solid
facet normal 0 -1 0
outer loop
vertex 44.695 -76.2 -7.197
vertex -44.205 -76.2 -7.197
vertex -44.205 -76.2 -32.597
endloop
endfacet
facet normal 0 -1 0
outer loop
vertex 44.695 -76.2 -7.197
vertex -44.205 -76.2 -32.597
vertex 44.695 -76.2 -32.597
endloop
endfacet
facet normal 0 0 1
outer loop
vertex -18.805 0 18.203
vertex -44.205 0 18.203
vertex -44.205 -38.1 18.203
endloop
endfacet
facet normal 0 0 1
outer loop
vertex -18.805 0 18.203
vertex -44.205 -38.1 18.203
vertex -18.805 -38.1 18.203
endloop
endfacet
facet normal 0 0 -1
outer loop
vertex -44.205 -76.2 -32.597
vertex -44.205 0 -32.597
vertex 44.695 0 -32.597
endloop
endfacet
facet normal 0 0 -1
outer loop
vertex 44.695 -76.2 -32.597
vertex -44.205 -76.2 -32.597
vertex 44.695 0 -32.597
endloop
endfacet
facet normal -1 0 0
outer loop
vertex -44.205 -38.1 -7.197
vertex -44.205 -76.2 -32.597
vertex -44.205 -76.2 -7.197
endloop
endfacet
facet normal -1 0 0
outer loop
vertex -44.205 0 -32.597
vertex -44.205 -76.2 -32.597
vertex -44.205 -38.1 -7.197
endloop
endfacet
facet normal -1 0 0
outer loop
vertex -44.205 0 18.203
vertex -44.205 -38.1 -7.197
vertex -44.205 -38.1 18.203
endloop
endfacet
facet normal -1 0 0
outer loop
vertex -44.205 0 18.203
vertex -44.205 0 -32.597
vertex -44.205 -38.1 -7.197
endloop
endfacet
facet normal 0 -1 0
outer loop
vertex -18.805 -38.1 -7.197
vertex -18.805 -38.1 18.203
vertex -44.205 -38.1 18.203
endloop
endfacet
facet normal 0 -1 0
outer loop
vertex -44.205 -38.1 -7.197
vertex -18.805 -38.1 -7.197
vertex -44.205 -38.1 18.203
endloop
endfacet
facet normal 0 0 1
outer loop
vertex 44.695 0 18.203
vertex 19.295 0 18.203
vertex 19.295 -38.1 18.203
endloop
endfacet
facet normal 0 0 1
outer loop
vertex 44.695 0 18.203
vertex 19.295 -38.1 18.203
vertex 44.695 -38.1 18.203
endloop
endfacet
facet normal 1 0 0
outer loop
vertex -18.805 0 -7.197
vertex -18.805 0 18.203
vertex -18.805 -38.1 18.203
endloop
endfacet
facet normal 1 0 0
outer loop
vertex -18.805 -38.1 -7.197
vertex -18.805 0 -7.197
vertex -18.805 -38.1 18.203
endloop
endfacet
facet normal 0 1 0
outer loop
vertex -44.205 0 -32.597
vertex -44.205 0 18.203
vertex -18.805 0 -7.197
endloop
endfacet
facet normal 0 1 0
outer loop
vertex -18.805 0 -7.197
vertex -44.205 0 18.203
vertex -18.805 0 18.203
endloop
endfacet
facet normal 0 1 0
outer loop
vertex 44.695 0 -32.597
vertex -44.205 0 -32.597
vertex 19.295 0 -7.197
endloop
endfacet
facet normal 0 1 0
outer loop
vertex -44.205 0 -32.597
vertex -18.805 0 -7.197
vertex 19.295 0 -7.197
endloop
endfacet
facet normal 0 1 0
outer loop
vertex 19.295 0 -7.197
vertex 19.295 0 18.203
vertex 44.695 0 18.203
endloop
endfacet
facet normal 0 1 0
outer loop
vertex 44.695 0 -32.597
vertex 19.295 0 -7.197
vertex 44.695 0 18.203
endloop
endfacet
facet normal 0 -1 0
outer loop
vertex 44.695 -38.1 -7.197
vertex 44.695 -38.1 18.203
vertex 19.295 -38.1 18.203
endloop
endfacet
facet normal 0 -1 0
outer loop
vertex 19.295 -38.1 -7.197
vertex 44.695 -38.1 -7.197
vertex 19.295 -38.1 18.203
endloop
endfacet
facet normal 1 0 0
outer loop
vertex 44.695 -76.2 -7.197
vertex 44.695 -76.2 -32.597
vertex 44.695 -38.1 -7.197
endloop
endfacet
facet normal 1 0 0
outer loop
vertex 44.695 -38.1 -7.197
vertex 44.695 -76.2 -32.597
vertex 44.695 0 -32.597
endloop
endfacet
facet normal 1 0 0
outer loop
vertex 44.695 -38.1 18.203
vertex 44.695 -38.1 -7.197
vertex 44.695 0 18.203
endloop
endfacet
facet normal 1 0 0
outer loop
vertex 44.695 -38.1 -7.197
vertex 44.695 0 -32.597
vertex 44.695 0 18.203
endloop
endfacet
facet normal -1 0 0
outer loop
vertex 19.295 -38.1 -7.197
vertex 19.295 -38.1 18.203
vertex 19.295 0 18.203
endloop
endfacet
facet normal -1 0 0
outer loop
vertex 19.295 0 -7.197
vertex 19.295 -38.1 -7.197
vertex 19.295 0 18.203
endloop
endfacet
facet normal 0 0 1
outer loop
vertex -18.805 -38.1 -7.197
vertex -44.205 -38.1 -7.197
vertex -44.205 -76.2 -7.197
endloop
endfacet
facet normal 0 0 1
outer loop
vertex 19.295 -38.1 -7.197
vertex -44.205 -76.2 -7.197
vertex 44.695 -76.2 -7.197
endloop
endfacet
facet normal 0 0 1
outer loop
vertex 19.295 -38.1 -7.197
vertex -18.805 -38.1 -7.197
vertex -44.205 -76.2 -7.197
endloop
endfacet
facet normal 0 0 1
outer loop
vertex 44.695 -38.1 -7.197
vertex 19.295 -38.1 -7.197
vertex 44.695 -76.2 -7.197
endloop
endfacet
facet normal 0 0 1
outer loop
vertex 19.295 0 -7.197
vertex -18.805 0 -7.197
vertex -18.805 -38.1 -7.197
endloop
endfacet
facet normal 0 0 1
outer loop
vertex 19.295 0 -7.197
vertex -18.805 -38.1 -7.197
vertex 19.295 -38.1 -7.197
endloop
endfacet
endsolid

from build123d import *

# Parameters (mm, degrees)
F0_W     = 88.9
F0_H     = 50.8
F1_DEPTH = 76.2
F3_DEPTH = 25.4


with BuildPart() as f1:
    # F0 (on Front) → F1 (new body)
    with BuildSketch(Plane.XZ):
        with Locations((0.244934, -7.196585)):
            Rectangle(F0_W, F0_H)
    extrude(amount=F1_DEPTH)

    # F2 (on face) → F3 (cut)
    with BuildSketch(Plane.XY.offset(18.203415)):
        Polygon((19.294934, 0), (-18.805066, 0), (-18.805066, -38.1), (-44.205066, -38.1), (-44.205066, -76.2), (44.694934, -76.2), (44.694934, -38.1), (19.294934, -38.1), align=None)
    extrude(amount=-F3_DEPTH, mode=Mode.SUBTRACT)


solid = f1.part
